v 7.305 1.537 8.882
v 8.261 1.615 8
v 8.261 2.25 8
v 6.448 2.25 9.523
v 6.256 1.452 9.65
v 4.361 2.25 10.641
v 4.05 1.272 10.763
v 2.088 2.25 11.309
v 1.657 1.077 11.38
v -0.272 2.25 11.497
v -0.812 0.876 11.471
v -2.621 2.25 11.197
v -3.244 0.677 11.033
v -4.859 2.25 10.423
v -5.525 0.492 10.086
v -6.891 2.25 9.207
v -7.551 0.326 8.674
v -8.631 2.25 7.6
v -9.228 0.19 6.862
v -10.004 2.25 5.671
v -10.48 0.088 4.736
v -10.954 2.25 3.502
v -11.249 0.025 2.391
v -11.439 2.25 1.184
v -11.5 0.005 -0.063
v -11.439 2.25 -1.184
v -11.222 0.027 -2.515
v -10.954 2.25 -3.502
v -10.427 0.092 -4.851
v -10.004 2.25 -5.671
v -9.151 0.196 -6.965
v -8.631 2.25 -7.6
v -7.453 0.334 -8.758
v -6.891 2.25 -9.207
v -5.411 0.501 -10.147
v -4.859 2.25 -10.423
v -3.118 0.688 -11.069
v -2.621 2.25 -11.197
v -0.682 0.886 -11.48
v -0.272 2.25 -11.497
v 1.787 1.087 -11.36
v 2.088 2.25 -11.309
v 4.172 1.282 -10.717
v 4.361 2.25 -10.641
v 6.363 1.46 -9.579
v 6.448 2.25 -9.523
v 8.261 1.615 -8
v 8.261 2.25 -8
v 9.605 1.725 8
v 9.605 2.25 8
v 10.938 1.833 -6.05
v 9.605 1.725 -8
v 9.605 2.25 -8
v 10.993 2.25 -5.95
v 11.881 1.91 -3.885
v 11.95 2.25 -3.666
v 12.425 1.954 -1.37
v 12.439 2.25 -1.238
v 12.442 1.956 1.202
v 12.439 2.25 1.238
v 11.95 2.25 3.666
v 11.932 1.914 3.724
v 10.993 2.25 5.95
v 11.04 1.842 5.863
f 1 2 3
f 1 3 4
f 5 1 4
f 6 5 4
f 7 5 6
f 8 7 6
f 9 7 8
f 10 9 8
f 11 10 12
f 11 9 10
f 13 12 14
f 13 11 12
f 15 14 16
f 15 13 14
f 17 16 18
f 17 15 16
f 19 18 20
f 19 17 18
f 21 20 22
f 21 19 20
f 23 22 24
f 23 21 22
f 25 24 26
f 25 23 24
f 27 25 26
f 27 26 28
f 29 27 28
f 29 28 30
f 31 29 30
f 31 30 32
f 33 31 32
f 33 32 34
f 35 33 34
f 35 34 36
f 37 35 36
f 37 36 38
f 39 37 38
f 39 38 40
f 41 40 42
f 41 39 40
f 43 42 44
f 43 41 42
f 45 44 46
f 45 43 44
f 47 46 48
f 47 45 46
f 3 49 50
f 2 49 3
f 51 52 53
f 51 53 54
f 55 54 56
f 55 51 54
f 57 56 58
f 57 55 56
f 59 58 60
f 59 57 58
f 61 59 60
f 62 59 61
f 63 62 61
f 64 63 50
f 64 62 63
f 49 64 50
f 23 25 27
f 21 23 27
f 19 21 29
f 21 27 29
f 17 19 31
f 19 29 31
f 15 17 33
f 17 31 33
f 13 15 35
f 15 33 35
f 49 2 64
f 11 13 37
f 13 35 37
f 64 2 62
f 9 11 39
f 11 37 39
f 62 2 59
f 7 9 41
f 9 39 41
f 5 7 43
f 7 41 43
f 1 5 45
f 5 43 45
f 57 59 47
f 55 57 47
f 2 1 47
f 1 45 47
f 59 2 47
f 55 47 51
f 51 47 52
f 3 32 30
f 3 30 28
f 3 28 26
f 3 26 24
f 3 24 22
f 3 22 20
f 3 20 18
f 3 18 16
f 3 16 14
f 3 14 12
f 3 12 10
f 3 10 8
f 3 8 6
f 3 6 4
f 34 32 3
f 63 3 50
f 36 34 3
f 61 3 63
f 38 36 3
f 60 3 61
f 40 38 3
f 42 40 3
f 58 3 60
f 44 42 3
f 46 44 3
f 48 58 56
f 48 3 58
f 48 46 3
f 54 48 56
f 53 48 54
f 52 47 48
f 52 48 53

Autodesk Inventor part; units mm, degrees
ref_plane "YZ Plane" through (0, 0, 0) normal (1, 0, 0) x (0, 1, 0)
ref_plane "XZ Plane" through (0, 0, 0) normal (0, 1, 0) x (-1, 0, 0)
ref_plane "XY Plane" through (0, 0, 0) normal (0, 0, 1) x (1, 0, 0)
sketch "Sketch1" plane through (0, 0, 0) normal (0, 1, 0) x (-1, 0, 0)
  arc A0 (-8.2614, -8) -> (-8.2614, 8) centre (0, 0) ccw
  line L0 (-9.6047, 8) -> (-8.2614, 8)
  arc A1 (-9.6047, 8) -> (-9.6047, -8) centre (0, 0) ccw
  line L1 (-8.2614, -8) -> (-9.6047, -8)
extrude "Extrusion1" add sketch "Sketch1" along normal blind 3
sketch "Sketch2" plane through (0, 0, 0) normal (0, 0, 1) x (1, 0, 0)
  line L0 (12.9833, 2.607) -> (12.9833, 0)
  line L1 (12.9833, 0) -> (-11.5556, 0)
  line L2 (-11.5556, 0) -> (12.9833, 2)
  point P0 (0, 0)
extrude "Extrusion2" cut sketch "Sketch2" along normal mid plane 26.25
sketch "Sketch3" plane through (0, 3, 0) normal (0, 1, 0) x (1, 0, 0)
  line L0 (9.6047, 8) -> (8.2614, 8) projected
  arc A0 (8.2614, 8) -> (8.2614, -8) centre (0, 0) ccw projected
  line L1 (8.2614, -8) -> (9.6047, -8) projected
  arc A1 (9.6047, -8) -> (9.6047, 8) centre (0, 0) ccw projected
extrude "Extrusion3" cut sketch "Sketch3" against normal blind 0.75
properties part number "5_grader_adapter" material "S355J2+N"
